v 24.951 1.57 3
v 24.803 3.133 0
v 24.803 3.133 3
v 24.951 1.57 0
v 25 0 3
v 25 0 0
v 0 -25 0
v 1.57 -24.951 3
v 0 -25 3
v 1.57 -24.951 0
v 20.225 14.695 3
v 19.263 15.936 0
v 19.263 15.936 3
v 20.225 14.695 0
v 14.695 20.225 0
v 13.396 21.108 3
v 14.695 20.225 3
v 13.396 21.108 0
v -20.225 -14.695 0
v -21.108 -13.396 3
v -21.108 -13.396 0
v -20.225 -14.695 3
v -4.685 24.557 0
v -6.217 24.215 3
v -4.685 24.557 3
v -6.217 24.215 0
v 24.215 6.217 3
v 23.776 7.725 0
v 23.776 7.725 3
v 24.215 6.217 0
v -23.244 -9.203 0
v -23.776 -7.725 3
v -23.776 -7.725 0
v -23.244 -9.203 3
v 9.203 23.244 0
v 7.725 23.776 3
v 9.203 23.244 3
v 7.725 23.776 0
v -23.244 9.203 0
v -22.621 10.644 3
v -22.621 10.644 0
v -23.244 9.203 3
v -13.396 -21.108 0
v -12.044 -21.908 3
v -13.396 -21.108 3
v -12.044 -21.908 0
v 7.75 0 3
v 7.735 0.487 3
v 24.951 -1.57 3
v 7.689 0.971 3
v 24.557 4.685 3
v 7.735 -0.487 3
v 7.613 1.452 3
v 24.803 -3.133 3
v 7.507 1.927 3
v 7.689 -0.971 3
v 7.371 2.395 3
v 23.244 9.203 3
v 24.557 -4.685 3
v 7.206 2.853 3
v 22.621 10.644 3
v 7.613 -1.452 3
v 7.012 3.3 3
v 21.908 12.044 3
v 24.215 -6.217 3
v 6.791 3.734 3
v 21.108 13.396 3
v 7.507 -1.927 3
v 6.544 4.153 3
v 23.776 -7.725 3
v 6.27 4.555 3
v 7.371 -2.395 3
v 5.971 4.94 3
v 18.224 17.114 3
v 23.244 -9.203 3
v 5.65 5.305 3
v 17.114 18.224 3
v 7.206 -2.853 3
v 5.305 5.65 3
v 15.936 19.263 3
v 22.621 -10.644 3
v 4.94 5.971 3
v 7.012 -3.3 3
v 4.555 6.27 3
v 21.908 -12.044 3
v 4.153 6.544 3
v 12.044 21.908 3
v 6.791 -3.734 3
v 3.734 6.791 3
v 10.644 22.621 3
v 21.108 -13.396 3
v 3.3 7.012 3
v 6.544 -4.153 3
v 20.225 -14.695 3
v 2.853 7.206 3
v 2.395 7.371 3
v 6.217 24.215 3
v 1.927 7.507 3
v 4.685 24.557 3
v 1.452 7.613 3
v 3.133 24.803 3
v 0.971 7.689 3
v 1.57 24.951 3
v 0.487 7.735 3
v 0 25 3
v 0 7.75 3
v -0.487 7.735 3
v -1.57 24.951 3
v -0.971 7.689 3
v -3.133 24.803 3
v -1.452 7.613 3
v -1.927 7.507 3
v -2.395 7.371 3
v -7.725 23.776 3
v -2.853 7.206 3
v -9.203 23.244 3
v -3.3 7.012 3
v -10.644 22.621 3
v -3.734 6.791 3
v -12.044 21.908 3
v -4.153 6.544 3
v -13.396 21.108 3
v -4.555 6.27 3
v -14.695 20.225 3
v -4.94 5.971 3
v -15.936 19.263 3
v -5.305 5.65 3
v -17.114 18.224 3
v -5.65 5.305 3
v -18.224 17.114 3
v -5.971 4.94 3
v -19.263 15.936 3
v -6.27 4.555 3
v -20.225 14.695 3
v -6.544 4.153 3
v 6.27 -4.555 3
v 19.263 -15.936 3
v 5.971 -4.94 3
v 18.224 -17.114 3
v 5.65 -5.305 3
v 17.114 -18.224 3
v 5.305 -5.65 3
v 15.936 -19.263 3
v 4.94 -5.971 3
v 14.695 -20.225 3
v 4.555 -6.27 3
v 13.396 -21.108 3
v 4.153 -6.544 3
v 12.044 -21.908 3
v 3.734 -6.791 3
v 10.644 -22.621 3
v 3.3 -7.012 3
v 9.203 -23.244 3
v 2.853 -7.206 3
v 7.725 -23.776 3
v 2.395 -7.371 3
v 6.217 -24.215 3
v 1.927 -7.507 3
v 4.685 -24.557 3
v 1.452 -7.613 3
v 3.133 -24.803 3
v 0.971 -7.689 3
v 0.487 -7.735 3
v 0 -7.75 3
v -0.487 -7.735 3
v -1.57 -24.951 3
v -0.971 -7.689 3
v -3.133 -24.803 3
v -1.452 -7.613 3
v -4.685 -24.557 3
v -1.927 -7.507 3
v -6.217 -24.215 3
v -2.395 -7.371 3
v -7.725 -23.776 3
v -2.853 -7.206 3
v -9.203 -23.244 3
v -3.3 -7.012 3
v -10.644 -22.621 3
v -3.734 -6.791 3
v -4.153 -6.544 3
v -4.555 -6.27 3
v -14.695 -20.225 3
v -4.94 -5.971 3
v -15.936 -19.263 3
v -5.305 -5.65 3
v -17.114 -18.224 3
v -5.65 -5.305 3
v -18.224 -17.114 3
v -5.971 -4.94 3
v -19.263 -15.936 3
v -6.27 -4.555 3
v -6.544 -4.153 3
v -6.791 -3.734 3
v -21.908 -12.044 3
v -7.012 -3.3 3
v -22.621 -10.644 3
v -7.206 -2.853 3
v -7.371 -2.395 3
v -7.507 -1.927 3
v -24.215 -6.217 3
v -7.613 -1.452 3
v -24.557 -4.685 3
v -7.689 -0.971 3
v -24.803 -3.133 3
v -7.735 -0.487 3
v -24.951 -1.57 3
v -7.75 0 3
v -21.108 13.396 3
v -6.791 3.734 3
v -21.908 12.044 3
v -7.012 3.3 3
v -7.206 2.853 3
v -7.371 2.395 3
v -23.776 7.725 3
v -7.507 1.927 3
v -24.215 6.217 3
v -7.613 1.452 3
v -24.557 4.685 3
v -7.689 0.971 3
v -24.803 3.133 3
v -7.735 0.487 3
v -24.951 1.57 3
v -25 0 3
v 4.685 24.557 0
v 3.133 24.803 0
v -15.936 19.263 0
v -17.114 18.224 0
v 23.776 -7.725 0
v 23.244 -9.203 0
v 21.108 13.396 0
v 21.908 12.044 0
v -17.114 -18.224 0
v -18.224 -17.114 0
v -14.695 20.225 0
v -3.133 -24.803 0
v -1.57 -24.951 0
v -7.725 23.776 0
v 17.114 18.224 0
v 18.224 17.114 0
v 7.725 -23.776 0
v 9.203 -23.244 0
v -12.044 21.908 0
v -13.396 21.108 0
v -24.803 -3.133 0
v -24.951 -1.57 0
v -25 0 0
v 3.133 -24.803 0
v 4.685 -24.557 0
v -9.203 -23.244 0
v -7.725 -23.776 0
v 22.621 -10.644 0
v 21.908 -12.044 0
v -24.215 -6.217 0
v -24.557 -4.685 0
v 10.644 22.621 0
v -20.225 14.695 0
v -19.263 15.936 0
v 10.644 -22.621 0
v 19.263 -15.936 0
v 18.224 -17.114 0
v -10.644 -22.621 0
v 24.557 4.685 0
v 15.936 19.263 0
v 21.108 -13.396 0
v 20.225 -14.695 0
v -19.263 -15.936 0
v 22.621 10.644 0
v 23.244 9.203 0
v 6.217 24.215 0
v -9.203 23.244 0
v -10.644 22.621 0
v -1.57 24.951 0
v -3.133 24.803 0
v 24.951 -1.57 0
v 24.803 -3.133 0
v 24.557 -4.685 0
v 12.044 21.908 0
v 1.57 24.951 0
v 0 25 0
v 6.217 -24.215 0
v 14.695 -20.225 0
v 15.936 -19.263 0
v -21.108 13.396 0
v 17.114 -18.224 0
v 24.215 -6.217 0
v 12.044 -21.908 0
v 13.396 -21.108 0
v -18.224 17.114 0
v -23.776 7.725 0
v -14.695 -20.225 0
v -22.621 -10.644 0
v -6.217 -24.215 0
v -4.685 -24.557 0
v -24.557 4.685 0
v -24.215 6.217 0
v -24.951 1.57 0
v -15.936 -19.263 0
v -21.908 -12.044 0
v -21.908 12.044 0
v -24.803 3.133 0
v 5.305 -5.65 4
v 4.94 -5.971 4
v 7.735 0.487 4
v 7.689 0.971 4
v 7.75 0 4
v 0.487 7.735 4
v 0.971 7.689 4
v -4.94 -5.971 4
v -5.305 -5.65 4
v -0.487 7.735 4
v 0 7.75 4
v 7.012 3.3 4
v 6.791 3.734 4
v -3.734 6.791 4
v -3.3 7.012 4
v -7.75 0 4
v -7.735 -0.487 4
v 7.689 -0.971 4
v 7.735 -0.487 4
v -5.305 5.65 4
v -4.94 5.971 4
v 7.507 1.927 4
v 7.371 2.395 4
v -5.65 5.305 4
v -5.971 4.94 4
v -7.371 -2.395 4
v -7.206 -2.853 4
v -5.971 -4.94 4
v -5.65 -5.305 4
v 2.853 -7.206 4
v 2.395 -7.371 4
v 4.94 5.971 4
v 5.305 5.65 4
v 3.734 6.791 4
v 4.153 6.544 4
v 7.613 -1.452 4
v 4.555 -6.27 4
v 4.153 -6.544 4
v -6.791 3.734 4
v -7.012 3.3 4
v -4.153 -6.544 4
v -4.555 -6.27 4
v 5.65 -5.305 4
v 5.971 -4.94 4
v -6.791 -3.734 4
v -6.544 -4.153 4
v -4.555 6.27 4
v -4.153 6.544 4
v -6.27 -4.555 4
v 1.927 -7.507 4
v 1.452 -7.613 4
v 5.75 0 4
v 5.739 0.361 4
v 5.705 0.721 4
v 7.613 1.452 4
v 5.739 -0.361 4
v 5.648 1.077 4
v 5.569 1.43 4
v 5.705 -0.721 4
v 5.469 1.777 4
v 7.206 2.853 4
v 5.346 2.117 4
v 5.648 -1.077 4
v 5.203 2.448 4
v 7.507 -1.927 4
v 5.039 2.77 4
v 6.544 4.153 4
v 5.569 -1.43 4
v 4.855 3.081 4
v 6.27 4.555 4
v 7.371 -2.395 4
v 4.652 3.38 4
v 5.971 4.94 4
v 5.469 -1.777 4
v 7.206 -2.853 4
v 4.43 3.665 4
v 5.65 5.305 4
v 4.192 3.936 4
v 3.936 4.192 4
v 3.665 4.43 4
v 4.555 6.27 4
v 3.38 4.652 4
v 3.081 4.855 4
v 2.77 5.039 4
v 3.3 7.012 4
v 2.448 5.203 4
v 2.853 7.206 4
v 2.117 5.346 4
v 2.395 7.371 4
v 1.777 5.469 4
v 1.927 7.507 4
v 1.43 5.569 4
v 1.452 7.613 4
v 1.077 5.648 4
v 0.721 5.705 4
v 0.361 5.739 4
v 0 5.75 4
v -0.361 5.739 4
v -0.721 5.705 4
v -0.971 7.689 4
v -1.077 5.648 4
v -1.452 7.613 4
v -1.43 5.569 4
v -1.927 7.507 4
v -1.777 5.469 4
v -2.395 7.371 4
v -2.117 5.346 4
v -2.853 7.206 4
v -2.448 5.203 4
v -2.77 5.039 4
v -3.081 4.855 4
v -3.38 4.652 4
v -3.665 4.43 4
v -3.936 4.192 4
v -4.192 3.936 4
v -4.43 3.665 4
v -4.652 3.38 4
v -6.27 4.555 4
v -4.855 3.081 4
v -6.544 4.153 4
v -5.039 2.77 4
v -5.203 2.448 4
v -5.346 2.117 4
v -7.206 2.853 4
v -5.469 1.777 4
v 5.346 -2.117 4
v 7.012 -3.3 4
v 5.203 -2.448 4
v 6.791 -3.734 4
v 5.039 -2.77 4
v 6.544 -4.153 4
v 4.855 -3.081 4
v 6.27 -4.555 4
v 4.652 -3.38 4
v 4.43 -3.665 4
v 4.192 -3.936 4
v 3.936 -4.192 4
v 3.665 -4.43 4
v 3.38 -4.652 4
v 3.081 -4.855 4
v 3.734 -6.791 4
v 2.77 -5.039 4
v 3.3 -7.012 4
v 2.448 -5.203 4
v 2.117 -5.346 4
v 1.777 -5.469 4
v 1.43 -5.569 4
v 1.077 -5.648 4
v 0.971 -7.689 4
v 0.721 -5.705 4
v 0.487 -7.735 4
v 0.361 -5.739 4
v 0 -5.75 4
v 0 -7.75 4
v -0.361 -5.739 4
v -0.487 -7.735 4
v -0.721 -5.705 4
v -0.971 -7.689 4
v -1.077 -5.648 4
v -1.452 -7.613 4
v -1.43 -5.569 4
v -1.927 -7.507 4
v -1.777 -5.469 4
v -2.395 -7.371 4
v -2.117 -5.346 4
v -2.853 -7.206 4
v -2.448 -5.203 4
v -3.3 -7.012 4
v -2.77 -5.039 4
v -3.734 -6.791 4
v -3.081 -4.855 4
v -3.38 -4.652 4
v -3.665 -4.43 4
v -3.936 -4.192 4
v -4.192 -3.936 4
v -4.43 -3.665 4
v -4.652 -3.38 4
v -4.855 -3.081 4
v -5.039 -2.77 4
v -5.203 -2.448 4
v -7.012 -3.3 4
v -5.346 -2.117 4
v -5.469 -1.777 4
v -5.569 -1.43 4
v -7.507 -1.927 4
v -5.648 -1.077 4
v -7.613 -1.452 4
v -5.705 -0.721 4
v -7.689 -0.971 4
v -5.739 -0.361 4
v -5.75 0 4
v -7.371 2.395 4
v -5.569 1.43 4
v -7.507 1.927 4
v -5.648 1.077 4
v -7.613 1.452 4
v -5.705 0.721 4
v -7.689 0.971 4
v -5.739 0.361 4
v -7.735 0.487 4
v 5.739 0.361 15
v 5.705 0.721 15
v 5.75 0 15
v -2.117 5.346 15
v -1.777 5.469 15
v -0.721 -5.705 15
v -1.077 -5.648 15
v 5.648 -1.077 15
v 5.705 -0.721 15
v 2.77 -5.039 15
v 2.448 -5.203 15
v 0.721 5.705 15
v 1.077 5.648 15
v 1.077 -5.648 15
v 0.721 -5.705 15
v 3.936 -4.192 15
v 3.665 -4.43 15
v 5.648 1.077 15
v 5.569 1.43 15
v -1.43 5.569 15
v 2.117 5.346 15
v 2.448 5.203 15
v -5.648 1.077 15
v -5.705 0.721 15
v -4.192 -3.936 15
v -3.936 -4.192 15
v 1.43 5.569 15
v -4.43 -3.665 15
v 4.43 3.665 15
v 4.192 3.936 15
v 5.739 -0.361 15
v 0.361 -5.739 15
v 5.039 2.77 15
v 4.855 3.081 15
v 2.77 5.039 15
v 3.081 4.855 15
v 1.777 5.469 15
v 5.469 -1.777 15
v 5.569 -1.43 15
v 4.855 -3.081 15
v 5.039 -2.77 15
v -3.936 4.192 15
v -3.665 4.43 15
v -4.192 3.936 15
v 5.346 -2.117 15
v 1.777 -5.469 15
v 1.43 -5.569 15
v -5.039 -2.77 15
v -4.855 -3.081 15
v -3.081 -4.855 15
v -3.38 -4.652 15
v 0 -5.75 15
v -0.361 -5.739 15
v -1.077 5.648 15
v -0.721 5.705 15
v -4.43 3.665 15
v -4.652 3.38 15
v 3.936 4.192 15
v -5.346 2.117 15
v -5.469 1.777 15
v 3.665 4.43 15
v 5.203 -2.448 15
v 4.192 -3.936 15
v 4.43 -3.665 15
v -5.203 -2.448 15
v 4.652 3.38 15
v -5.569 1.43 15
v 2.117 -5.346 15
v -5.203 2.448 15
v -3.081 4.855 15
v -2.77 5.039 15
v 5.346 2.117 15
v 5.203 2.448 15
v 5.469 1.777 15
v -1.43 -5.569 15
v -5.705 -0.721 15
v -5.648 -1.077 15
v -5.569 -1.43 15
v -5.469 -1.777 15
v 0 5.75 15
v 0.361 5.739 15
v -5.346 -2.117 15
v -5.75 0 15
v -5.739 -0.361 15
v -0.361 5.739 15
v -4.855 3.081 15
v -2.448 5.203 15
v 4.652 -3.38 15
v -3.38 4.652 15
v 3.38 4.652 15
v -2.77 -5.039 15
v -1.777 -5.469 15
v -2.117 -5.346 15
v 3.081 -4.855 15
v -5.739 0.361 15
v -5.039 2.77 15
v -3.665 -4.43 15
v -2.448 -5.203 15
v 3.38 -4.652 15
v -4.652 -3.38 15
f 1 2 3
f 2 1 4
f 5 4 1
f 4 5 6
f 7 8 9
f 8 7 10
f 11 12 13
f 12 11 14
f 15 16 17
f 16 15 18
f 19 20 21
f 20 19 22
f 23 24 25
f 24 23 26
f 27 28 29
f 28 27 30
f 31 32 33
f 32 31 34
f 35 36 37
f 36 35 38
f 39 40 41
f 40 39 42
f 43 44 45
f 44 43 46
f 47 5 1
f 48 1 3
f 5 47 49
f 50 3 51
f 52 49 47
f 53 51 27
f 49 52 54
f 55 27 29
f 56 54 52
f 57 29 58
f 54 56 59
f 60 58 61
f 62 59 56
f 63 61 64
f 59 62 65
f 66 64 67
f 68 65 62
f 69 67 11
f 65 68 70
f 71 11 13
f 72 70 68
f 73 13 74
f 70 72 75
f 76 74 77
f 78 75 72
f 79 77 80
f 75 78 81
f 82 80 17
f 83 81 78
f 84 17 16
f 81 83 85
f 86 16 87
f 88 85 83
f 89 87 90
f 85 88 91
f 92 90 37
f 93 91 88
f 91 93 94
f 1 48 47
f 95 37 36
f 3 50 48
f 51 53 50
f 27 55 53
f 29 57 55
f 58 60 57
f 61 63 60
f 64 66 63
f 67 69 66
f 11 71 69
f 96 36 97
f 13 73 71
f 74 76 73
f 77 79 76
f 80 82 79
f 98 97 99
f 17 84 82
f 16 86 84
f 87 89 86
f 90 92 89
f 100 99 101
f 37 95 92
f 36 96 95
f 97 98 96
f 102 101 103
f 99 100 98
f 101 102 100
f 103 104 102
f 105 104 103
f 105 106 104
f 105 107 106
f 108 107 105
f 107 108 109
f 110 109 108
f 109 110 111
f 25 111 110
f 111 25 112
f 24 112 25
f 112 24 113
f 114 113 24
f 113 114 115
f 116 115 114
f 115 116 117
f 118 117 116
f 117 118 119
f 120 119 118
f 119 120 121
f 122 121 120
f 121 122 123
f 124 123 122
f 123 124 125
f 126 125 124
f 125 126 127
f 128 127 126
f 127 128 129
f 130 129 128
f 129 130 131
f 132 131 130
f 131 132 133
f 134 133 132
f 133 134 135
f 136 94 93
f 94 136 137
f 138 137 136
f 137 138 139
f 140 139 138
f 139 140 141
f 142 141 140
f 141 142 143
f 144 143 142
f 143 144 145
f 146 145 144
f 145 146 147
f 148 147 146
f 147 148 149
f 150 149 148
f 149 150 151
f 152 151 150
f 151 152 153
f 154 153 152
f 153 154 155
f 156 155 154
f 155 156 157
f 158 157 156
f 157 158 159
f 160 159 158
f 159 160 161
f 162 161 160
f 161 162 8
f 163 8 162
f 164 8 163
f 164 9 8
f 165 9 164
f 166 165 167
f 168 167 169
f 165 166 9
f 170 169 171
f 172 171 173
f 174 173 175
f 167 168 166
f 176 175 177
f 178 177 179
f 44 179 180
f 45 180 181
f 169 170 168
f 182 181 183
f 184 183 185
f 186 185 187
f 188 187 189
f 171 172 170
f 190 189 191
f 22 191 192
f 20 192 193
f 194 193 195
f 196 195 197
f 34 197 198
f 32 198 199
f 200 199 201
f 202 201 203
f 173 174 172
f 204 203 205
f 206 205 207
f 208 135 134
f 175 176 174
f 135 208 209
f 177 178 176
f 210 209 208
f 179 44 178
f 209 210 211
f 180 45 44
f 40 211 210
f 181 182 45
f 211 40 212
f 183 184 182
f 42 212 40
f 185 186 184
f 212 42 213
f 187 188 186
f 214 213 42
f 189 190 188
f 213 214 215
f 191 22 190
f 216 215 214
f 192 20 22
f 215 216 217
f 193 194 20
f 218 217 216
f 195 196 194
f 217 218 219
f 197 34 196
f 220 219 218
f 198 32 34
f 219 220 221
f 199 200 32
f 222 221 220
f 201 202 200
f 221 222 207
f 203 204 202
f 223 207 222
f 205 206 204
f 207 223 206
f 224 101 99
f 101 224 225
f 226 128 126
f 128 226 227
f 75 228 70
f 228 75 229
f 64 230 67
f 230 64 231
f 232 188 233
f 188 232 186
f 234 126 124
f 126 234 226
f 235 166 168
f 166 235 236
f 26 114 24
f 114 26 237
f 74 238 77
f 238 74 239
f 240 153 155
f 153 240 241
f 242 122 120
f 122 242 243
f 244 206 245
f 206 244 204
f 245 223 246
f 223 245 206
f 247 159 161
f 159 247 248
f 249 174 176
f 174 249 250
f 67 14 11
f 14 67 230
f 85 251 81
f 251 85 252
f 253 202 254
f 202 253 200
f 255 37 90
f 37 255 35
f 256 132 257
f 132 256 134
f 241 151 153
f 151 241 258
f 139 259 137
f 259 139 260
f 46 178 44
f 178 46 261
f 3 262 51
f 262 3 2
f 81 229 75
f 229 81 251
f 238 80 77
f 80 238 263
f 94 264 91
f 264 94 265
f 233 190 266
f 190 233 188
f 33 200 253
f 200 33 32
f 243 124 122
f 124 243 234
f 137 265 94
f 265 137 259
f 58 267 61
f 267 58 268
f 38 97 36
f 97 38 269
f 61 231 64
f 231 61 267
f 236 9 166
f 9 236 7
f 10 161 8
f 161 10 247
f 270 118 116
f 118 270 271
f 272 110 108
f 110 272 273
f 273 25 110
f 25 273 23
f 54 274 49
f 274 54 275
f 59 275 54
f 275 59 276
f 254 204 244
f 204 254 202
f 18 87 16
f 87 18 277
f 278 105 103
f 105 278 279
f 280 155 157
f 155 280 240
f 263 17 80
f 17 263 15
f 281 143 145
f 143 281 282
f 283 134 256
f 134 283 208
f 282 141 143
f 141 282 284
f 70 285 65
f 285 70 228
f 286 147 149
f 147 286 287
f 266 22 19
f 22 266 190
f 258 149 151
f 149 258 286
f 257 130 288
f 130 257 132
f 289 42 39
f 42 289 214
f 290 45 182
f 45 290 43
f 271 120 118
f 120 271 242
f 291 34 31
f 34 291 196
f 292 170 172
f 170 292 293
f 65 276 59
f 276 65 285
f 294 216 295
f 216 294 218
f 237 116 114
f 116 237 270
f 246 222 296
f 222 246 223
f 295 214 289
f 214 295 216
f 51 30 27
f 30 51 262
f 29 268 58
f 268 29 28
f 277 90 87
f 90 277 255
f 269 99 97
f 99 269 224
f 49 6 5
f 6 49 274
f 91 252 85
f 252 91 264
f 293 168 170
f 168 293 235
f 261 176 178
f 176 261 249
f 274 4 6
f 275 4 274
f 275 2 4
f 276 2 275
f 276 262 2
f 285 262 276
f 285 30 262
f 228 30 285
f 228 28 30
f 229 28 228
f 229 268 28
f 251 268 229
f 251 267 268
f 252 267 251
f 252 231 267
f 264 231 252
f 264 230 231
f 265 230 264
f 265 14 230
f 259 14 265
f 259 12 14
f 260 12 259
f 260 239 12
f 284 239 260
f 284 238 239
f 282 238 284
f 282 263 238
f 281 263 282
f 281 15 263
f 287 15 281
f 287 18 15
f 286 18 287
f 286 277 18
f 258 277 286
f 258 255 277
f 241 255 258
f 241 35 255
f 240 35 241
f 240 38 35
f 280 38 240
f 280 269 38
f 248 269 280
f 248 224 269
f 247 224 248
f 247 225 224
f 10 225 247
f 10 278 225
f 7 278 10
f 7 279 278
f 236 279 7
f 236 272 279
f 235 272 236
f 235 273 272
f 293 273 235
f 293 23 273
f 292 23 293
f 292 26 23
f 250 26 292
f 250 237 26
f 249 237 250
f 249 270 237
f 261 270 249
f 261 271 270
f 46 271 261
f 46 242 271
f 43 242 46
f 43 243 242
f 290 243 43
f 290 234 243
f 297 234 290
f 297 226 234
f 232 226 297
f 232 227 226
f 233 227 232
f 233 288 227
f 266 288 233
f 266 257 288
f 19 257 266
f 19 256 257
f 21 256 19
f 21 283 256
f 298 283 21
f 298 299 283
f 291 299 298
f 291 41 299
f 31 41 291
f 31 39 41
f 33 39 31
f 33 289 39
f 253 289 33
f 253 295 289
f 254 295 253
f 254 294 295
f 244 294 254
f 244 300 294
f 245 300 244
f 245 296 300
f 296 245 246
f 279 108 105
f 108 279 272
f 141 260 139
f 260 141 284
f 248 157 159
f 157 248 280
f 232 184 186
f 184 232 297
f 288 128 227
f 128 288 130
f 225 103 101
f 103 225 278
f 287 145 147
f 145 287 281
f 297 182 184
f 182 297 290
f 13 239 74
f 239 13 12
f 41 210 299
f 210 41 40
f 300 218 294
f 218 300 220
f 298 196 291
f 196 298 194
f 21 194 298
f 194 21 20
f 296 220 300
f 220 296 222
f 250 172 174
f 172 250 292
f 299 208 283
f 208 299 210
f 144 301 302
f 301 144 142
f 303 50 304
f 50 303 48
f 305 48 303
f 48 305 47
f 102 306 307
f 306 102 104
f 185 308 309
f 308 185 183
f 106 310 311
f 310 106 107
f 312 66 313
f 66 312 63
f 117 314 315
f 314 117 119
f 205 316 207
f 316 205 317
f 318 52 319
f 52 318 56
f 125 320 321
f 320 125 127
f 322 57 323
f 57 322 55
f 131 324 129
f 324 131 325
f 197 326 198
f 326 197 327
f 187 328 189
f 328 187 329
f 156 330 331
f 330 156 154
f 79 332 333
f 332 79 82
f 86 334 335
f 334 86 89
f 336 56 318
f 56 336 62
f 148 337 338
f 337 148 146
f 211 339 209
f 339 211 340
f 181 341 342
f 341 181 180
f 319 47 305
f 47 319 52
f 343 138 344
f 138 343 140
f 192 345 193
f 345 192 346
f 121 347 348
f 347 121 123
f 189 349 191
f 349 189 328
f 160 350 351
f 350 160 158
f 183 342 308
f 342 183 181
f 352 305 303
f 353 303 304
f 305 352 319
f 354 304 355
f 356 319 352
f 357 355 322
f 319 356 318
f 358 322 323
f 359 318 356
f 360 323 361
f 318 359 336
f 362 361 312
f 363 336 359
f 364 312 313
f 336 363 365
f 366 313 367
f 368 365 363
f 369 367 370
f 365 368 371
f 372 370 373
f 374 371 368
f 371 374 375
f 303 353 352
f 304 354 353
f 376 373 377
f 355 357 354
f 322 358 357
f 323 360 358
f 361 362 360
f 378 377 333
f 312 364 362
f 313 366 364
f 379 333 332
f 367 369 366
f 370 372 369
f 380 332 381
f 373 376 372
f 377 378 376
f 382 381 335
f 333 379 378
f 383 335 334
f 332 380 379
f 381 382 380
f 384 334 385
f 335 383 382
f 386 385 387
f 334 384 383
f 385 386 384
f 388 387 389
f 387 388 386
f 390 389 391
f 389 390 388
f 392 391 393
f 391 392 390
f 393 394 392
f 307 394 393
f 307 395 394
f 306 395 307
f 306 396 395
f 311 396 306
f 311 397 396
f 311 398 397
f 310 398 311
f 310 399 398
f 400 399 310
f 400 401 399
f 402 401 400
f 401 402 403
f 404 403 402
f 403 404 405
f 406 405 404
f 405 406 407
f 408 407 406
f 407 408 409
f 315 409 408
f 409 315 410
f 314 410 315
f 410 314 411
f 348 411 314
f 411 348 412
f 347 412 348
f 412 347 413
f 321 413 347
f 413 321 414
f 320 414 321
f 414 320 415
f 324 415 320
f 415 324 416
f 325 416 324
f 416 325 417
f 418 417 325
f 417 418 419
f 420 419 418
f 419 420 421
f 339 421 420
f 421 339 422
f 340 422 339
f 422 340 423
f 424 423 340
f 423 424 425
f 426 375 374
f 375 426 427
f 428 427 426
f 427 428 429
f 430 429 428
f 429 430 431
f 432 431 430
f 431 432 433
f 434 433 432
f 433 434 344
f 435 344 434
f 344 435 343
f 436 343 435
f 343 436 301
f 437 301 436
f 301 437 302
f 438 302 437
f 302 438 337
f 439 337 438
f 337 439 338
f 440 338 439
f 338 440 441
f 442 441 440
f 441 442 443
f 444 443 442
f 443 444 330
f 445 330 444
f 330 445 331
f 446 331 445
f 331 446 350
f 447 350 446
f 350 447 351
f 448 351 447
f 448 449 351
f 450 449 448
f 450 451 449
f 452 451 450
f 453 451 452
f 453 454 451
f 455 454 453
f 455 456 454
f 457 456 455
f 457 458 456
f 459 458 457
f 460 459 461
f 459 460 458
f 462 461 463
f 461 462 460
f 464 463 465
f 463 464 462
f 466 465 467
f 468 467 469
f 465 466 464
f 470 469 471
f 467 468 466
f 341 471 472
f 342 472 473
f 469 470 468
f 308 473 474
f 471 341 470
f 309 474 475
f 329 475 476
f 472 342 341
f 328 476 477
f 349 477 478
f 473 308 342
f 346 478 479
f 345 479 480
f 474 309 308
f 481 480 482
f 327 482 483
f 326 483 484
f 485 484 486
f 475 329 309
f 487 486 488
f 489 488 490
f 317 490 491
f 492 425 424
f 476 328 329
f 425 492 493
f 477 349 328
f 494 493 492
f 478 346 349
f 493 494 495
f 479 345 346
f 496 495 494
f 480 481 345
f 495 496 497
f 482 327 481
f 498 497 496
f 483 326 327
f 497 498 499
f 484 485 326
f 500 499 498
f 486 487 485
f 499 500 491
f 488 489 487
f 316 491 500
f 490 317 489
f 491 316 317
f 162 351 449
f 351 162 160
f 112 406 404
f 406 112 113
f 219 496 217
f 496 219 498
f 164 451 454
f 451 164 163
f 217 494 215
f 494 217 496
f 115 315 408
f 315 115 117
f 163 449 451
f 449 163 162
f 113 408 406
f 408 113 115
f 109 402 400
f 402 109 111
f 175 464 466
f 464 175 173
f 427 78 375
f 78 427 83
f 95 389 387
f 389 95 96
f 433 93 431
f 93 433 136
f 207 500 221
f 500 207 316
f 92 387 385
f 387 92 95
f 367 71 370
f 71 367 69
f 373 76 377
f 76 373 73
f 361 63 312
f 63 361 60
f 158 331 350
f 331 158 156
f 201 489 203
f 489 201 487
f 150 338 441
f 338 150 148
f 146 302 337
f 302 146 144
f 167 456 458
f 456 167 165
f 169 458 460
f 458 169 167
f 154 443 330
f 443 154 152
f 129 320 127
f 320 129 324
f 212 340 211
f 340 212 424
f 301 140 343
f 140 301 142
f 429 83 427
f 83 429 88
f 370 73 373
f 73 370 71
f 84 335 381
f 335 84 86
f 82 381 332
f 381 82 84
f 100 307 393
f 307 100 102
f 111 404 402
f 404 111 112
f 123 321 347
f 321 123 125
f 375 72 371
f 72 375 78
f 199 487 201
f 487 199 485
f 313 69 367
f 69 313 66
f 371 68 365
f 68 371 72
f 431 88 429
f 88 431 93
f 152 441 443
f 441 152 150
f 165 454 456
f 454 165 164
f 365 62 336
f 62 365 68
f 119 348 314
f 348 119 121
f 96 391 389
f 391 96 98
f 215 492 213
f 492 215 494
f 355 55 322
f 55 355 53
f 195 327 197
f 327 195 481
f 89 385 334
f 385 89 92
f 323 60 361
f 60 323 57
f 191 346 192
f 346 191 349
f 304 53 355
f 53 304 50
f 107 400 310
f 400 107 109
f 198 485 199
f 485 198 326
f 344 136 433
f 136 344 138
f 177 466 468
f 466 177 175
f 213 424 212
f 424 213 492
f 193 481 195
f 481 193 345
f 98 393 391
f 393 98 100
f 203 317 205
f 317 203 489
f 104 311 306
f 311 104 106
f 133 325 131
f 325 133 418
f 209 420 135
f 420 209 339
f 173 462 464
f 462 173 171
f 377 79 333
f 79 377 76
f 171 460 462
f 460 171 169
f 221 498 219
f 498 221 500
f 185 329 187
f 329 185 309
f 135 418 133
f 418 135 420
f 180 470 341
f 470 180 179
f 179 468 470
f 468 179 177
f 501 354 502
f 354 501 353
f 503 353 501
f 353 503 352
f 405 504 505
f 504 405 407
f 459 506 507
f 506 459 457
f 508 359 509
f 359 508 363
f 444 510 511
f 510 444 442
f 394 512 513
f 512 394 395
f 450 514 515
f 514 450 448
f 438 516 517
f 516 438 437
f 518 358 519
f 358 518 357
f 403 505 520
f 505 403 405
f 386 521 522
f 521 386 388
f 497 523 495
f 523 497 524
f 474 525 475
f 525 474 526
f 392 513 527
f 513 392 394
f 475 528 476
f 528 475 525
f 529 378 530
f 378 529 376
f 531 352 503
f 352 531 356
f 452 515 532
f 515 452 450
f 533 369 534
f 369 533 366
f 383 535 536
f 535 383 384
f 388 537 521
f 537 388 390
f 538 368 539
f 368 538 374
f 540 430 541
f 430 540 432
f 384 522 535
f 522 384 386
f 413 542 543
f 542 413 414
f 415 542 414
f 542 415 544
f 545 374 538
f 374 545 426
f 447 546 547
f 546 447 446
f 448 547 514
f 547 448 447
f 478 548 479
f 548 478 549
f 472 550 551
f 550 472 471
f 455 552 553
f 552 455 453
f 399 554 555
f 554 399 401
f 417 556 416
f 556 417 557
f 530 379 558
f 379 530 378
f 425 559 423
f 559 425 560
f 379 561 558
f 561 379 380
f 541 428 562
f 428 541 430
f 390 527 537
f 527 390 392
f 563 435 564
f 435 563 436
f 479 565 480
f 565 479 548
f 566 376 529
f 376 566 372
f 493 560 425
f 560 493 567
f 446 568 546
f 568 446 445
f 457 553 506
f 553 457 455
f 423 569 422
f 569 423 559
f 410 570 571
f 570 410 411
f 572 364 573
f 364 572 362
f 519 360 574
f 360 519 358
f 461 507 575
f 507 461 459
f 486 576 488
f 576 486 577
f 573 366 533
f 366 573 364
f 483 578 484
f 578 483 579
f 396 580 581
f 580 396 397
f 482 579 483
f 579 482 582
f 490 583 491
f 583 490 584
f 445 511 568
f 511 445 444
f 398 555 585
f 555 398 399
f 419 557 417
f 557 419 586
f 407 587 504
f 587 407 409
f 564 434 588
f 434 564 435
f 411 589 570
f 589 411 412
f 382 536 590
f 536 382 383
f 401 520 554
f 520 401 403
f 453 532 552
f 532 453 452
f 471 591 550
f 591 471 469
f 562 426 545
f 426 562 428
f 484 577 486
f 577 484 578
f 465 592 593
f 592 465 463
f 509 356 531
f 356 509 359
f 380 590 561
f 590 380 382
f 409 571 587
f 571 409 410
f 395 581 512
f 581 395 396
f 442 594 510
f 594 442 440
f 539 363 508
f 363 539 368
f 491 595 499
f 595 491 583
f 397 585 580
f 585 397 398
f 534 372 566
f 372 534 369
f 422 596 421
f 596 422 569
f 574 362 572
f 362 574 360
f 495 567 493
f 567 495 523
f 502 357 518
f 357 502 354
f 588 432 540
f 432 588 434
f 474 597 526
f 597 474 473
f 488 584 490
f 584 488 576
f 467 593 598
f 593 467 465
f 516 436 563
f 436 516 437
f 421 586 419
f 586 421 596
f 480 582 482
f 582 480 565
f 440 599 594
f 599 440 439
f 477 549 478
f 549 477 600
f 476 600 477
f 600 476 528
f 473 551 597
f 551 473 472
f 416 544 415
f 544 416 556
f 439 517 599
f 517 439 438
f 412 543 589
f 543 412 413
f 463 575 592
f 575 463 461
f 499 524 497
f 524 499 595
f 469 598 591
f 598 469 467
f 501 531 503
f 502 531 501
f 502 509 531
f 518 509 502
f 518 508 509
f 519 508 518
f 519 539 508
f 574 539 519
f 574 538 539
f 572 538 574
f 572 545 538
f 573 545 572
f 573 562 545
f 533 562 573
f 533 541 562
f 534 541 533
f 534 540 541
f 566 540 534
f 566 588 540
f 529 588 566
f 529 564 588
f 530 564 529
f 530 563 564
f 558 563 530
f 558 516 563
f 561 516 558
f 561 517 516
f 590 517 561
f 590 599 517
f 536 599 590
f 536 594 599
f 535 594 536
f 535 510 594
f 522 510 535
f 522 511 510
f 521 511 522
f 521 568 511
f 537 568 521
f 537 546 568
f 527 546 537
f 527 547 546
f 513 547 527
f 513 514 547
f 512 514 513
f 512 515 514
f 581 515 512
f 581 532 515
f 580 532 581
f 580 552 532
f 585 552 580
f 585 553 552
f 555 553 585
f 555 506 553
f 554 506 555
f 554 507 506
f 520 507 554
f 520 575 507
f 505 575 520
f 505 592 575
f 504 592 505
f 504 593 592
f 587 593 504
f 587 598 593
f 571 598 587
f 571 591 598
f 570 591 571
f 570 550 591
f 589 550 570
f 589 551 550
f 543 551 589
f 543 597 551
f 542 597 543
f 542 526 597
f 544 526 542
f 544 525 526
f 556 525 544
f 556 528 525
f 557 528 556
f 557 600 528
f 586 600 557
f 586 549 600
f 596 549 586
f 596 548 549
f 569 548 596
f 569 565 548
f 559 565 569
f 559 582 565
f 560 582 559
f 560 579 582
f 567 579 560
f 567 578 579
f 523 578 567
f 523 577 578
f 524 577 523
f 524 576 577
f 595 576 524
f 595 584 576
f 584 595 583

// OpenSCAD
THICKNESS = 3;
DIAMETER = 50;
BEARING_INNER_DIAMETER = 11.5;
BEARING_LIP_DIAMETER = BEARING_INNER_DIAMETER + 4;
BEARING_LIP_THICKNESS = 1;
BEARING_THICKNESS = 12;

$fn = 100;

union() {
    cylinder(h = THICKNESS, d = DIAMETER);
    cylinder(h = THICKNESS+BEARING_LIP_THICKNESS, d = BEARING_LIP_DIAMETER);
    cylinder(h = THICKNESS + BEARING_THICKNESS, d = BEARING_INNER_DIAMETER);
}
